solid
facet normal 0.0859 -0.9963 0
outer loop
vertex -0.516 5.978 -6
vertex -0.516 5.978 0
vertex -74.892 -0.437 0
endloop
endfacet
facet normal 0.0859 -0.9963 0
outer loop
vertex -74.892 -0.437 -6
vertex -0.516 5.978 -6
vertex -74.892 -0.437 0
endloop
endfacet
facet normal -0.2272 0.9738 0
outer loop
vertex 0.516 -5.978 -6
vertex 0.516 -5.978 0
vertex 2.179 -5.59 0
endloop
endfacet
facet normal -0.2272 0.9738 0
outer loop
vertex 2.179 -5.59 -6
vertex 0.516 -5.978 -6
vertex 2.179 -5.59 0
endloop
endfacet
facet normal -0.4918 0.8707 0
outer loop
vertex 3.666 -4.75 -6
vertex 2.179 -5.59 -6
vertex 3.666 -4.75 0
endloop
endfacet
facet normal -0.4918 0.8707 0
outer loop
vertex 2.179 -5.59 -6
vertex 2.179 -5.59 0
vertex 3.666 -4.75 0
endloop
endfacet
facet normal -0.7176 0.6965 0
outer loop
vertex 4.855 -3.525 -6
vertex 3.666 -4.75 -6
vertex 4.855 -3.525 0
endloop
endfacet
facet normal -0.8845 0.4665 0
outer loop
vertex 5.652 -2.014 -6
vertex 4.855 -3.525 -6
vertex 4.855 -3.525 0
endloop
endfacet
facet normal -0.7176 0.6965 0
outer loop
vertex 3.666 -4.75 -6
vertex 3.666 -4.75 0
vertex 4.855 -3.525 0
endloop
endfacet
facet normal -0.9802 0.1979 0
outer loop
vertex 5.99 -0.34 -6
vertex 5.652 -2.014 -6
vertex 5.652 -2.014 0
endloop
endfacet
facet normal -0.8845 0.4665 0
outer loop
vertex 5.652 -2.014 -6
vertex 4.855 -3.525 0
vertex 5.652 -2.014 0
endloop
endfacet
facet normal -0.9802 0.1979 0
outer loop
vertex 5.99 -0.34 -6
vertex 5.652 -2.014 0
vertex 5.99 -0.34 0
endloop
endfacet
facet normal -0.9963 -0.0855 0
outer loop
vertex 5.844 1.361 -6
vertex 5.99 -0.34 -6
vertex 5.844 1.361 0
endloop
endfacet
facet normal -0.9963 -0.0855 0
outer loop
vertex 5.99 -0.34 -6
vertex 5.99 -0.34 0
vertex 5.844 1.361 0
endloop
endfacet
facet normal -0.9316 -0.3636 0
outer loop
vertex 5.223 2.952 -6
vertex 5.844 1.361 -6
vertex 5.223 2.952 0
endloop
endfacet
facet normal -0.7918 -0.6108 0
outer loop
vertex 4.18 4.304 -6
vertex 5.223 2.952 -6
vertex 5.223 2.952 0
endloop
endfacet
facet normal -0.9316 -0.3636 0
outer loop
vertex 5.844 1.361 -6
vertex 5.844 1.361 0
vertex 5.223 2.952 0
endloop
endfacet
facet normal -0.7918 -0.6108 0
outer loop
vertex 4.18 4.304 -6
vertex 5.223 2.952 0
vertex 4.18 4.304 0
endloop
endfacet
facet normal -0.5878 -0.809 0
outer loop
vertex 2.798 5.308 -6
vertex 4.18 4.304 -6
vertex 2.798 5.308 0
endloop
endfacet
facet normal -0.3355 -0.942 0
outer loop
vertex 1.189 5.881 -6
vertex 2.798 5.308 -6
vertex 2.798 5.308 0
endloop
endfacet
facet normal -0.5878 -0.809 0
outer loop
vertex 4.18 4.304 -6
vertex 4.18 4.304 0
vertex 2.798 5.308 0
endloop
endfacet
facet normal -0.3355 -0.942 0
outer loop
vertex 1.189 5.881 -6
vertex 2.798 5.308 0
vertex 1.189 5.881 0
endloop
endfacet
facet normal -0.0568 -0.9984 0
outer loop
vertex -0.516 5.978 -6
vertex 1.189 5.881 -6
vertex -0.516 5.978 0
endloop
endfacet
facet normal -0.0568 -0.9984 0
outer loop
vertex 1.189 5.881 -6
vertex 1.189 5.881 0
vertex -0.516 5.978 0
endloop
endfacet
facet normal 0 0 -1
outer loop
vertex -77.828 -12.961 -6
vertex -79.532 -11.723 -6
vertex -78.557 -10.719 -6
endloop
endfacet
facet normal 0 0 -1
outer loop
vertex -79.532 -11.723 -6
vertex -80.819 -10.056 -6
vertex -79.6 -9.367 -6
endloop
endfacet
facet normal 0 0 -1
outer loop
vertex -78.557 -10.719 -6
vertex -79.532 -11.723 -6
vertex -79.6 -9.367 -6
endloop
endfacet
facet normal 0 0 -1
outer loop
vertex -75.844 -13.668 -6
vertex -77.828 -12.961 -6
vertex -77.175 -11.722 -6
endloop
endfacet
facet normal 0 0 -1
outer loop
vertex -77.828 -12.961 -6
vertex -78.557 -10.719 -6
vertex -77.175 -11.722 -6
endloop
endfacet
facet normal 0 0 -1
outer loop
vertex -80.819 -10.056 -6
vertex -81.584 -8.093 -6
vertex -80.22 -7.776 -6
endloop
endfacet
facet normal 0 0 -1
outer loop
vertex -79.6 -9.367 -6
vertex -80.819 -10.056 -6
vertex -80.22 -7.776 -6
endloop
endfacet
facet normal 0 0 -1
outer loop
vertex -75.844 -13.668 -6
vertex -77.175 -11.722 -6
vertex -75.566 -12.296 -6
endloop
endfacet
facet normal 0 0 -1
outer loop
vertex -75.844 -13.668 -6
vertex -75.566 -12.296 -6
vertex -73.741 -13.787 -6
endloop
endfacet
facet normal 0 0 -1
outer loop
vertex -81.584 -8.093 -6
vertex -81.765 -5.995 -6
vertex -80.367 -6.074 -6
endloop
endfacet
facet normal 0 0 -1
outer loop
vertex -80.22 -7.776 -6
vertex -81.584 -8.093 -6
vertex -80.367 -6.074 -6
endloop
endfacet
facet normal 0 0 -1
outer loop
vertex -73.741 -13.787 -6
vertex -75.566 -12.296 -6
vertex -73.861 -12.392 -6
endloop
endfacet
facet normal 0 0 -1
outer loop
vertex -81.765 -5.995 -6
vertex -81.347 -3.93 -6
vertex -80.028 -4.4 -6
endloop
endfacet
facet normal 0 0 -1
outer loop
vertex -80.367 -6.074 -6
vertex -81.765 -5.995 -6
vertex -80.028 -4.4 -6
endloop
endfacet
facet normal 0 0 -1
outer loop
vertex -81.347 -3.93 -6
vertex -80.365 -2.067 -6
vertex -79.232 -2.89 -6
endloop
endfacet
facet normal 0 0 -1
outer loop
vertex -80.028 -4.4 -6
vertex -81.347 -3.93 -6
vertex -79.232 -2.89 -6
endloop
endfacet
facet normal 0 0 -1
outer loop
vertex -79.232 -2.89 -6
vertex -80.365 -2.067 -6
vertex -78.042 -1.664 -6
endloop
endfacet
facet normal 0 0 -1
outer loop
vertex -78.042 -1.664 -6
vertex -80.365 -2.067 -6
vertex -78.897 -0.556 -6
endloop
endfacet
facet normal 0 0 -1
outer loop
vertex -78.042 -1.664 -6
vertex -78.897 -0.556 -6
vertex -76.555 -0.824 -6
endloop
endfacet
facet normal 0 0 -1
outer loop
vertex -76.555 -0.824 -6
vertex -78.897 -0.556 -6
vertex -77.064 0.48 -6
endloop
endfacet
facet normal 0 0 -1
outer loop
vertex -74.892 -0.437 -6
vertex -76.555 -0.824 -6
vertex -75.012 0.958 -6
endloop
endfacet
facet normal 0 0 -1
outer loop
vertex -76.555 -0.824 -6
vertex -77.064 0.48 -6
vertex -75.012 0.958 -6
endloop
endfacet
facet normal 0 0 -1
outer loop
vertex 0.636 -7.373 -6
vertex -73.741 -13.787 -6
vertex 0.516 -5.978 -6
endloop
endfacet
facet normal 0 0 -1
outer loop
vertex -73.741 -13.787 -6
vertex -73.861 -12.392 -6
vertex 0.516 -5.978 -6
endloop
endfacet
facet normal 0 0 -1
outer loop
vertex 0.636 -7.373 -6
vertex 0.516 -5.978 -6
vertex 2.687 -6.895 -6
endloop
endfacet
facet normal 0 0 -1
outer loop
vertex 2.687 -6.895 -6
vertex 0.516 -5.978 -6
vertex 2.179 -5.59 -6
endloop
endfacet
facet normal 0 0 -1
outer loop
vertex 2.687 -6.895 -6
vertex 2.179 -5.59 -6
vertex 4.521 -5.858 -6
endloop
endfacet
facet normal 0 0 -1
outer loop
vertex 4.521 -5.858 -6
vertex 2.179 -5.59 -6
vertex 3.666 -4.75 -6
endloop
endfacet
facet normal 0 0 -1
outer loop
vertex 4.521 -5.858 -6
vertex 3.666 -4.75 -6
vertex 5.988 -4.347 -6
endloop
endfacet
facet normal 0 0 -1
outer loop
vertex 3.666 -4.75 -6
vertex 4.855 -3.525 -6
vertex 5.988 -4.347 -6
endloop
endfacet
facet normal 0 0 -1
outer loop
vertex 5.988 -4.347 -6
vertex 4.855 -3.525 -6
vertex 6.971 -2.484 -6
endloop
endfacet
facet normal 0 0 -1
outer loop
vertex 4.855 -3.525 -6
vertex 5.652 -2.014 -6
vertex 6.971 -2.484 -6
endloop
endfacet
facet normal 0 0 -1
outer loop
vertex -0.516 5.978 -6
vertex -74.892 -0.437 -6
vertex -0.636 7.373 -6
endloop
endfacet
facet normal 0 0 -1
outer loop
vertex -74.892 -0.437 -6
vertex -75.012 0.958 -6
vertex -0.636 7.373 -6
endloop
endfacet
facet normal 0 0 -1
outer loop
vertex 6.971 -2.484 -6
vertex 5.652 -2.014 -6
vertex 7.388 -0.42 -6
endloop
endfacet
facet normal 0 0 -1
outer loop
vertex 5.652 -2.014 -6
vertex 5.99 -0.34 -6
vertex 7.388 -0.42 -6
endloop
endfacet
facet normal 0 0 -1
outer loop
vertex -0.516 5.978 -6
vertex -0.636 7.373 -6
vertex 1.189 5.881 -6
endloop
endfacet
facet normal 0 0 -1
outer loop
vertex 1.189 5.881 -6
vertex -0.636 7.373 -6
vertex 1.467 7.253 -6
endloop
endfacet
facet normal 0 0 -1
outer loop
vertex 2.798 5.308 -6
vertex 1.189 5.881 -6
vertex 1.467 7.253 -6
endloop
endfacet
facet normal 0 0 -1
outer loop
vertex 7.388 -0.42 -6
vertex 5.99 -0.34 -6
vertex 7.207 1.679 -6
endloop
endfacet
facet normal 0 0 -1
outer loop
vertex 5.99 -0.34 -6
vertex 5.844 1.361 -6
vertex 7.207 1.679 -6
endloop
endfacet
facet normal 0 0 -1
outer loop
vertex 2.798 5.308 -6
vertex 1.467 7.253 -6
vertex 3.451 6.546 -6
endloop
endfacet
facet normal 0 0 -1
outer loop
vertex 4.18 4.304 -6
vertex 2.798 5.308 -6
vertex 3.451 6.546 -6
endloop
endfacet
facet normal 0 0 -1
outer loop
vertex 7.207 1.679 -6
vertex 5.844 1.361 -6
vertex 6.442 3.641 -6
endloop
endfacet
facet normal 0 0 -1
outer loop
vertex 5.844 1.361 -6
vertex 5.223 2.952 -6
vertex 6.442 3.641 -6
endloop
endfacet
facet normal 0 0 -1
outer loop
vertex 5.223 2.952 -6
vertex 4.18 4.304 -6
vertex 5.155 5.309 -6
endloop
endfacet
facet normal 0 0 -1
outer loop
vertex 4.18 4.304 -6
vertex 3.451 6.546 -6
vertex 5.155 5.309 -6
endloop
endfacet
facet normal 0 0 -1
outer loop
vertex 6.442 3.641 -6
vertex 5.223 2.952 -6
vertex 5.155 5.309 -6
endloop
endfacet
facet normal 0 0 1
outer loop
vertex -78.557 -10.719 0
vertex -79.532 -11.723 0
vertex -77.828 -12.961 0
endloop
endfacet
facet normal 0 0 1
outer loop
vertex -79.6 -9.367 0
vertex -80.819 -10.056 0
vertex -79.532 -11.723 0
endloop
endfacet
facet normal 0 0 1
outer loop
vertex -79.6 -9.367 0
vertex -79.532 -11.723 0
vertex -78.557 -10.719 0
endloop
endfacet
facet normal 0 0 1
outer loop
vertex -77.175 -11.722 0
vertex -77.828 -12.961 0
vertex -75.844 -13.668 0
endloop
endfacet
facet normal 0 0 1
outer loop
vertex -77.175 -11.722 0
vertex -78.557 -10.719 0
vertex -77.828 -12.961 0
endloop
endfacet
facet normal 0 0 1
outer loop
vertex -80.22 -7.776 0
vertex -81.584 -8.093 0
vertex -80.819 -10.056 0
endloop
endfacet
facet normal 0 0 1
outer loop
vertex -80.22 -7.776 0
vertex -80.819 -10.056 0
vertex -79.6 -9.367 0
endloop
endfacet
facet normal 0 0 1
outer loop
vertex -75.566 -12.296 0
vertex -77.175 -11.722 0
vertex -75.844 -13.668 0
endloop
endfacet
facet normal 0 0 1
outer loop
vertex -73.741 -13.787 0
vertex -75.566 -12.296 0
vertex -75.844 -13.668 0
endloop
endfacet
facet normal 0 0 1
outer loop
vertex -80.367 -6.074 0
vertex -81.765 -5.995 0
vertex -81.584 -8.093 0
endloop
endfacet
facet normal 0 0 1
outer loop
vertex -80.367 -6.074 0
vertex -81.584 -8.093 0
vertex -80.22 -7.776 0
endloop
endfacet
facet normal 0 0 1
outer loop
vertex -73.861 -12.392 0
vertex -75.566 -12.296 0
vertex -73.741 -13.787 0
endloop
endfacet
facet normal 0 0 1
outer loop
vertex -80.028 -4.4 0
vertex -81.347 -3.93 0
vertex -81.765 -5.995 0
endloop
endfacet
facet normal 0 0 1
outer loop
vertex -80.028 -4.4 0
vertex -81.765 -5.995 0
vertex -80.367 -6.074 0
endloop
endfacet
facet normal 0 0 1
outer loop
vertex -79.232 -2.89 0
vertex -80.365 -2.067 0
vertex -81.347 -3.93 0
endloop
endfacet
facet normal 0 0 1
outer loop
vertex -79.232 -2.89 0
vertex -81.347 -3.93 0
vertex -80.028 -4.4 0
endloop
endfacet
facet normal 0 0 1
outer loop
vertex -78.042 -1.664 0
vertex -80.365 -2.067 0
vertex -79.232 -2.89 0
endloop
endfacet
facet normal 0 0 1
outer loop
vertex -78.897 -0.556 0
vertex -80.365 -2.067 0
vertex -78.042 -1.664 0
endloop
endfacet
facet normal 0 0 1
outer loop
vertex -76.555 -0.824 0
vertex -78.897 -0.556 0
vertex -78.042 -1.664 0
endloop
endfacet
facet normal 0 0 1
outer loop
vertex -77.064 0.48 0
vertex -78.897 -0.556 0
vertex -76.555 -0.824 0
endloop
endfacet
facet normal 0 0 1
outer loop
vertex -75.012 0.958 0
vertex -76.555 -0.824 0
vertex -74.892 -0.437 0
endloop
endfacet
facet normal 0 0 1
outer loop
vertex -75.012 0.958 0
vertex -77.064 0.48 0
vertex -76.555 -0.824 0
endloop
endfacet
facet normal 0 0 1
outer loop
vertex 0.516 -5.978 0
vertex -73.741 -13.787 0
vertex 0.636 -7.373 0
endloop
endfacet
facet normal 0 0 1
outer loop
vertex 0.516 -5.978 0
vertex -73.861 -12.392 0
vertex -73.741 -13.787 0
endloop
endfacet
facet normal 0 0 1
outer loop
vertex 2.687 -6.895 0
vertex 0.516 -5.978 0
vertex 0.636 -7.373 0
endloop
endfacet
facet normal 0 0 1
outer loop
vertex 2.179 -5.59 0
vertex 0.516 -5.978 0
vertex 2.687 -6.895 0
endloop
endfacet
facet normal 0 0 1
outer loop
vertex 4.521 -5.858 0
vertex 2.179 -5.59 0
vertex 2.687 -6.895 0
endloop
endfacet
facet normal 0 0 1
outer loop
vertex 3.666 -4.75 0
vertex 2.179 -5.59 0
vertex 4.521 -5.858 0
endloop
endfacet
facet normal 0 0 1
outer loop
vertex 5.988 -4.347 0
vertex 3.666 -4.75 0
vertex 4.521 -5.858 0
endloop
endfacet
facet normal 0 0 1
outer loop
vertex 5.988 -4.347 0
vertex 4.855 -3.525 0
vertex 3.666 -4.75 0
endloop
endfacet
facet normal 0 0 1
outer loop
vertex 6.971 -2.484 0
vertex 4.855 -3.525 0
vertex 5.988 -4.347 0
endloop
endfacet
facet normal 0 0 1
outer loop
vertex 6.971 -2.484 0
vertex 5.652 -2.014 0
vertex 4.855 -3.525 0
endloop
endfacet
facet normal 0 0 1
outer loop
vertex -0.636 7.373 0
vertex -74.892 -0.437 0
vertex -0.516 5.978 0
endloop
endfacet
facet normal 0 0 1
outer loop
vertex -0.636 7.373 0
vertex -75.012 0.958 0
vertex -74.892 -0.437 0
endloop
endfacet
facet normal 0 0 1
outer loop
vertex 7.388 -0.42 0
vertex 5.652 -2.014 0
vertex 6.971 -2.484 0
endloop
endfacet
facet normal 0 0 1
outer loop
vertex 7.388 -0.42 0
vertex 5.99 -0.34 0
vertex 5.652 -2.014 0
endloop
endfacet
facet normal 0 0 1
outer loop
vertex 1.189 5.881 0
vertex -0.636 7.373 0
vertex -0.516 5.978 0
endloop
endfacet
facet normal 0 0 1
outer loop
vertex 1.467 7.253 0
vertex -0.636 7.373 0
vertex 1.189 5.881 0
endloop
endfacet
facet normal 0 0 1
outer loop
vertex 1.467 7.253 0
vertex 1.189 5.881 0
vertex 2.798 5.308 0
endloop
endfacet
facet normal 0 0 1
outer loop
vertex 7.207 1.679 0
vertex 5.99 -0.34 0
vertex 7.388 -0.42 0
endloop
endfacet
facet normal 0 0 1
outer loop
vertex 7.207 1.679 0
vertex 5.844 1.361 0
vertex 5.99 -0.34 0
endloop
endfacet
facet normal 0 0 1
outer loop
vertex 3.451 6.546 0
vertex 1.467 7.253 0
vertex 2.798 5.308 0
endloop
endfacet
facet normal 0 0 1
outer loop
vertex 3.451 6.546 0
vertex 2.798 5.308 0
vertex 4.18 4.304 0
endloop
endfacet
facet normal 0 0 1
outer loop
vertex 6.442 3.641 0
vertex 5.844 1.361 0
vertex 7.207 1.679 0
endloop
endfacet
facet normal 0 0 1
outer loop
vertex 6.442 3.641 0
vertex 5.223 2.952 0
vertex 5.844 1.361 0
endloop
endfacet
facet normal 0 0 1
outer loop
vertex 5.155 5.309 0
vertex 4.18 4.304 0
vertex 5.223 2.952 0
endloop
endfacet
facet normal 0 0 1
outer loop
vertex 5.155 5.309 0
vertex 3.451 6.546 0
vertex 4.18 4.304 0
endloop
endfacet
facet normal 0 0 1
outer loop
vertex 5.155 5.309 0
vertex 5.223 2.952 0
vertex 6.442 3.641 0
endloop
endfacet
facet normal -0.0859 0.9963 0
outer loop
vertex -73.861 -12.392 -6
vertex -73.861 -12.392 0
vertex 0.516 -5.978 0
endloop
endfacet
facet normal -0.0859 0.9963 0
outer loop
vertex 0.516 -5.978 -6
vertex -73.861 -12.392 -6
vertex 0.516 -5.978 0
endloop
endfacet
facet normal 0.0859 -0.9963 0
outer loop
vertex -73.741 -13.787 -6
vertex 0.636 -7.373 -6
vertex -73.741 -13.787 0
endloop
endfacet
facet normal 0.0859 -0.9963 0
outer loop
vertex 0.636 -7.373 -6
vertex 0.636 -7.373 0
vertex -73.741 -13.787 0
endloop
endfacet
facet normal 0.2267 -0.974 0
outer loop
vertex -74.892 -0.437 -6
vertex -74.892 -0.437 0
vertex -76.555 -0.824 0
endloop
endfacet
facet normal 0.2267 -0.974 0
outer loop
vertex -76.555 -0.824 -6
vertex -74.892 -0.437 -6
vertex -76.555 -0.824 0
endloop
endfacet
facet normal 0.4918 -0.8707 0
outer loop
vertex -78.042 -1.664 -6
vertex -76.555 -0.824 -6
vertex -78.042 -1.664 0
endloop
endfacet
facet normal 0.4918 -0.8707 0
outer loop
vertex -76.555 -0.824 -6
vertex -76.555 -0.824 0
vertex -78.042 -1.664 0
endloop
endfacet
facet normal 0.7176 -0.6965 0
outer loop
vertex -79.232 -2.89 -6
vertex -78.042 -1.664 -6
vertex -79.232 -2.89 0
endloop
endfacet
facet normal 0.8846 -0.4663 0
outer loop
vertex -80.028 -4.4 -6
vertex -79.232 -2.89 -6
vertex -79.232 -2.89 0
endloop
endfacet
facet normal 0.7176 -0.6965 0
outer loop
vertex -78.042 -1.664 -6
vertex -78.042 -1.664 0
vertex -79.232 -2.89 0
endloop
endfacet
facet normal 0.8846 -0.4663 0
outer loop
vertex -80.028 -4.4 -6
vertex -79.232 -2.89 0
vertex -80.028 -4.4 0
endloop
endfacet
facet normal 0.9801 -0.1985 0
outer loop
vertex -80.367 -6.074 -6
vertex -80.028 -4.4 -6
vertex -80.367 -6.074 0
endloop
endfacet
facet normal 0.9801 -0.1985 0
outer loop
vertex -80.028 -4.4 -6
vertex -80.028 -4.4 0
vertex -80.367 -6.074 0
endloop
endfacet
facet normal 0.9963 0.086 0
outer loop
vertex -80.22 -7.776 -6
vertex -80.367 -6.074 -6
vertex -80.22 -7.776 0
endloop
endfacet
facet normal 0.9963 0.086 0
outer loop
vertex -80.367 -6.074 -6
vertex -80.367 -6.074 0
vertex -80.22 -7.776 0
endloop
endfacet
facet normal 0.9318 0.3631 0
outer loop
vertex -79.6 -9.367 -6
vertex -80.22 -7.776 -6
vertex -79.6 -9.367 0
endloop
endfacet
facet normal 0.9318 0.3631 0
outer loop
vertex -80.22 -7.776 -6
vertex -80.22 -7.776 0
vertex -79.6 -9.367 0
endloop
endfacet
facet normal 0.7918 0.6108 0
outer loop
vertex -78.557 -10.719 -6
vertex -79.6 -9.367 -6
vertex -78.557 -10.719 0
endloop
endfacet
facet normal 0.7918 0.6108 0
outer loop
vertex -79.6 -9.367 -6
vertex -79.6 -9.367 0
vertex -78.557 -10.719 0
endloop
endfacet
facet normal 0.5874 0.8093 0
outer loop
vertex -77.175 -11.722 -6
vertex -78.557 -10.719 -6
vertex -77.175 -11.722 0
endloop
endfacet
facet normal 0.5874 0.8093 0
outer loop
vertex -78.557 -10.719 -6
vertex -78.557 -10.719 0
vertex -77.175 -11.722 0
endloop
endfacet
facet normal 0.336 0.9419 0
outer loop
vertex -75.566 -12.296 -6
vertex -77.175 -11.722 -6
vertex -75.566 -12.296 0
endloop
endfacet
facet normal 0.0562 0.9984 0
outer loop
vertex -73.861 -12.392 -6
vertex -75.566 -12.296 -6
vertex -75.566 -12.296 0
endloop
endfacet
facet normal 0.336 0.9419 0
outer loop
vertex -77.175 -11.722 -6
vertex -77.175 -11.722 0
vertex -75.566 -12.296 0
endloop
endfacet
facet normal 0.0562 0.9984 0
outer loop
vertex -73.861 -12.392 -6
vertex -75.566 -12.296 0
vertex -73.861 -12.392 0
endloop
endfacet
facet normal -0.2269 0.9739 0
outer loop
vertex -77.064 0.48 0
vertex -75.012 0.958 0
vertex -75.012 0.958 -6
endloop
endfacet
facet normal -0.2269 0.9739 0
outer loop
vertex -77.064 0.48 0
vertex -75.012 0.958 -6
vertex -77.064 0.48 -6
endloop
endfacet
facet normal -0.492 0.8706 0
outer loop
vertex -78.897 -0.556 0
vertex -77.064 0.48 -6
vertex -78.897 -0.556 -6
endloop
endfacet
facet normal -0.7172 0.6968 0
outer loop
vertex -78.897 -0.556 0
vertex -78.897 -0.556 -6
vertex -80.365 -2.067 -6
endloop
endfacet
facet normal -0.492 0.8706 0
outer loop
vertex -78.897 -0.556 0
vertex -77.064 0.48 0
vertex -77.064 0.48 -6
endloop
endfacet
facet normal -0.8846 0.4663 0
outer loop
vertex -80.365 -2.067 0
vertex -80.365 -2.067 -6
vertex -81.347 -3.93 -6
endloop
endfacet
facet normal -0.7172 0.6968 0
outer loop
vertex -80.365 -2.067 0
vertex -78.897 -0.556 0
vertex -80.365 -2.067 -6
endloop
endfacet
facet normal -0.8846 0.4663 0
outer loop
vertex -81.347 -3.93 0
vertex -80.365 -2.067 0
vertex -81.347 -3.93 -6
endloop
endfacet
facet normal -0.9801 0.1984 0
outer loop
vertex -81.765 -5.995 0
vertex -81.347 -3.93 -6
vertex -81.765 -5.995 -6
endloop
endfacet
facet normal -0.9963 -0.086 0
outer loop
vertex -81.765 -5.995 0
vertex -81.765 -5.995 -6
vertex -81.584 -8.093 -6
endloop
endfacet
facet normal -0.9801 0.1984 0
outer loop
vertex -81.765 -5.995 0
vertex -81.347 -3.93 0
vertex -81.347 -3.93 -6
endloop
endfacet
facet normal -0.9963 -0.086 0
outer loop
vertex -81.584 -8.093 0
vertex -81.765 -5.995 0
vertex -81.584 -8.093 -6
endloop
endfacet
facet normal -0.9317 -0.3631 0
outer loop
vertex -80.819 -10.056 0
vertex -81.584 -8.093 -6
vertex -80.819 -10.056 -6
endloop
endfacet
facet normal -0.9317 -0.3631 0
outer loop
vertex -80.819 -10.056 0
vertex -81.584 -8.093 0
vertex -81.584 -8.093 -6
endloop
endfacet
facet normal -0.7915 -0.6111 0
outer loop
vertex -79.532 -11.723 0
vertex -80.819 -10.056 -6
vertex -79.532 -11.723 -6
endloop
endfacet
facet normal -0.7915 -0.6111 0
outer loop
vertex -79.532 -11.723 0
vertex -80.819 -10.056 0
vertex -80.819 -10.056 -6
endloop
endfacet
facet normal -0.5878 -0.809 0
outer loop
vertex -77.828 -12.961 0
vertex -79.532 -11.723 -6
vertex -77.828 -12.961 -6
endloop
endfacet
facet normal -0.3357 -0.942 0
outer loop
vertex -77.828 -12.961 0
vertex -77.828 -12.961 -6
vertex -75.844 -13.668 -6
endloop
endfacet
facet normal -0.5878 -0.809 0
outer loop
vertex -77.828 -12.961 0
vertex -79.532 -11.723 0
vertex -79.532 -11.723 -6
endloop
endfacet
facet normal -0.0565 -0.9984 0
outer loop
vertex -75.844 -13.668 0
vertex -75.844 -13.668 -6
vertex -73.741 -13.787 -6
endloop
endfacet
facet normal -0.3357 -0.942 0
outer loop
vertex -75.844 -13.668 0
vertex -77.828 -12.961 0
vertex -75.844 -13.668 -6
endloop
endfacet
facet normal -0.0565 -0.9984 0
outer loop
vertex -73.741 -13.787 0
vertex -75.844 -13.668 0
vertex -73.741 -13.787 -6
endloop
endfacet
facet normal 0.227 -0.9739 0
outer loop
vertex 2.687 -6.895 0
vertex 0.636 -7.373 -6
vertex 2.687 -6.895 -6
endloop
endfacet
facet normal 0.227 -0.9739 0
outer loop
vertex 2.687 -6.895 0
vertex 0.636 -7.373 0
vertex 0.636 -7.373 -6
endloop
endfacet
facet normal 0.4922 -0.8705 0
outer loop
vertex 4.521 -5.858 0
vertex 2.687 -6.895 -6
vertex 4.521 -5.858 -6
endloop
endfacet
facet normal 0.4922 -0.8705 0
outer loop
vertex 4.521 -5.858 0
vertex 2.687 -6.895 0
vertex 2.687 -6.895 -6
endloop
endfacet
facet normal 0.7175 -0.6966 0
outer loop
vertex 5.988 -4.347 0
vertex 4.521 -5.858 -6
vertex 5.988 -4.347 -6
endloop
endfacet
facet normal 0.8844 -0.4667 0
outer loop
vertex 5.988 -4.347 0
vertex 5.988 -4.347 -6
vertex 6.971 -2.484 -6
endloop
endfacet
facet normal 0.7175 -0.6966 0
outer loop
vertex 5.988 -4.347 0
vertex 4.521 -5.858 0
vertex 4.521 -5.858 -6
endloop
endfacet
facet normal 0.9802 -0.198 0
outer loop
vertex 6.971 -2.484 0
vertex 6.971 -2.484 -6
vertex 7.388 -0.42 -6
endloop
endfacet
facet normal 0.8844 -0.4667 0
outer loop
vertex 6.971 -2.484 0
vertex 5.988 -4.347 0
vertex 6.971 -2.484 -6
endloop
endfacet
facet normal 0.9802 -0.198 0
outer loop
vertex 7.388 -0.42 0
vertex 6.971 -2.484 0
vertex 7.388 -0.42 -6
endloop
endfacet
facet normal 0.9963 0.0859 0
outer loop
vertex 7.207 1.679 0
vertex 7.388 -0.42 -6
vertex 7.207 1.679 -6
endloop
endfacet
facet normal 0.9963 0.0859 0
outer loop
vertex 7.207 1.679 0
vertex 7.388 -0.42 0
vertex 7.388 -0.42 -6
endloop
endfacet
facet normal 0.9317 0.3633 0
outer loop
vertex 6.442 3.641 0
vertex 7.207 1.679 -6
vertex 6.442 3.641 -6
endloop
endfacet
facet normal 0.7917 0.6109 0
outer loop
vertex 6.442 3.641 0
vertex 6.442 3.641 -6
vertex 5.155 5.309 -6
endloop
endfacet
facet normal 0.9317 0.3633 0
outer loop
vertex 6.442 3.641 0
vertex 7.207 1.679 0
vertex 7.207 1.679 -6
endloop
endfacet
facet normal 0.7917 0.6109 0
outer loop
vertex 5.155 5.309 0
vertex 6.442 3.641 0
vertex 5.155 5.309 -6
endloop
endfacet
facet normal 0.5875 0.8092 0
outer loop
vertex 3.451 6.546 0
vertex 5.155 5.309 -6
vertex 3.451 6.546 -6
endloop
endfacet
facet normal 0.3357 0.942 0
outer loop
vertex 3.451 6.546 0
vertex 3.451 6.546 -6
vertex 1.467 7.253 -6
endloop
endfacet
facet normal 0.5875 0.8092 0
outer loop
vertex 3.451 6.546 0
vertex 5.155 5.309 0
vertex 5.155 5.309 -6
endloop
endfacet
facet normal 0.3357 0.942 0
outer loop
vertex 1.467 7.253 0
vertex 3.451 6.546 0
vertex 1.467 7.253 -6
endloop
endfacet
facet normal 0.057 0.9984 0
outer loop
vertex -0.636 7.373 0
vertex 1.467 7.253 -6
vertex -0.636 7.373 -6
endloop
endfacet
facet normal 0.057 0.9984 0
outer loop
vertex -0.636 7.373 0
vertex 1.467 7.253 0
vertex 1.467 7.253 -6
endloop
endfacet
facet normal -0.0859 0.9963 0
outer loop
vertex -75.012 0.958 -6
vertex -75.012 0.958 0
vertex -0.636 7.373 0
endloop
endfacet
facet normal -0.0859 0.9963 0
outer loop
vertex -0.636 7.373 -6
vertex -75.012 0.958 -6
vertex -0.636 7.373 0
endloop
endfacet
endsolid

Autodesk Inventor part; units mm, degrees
ref_plane "YZ Plane" through (0, 0, 0) normal (1, 0, 0) x (0, 1, 0)
ref_plane "XZ Plane" through (0, 0, 0) normal (0, 1, 0) x (-1, 0, 0)
ref_plane "XY Plane" through (0, 0, 0) normal (0, 0, 1) x (1, 0, 0)
sketch "Эскиз1" plane through (0, 0, 0) normal (0, 0, 1) x (1, 0, 0)
  arc A0 (0.5156, -5.9778) -> (-0.5156, 5.9778) centre (0, 0) ccw
  arc A1 (0.6359, -7.3726) -> (-0.6359, 7.3726) centre (0, 0) ccw
  circle A2 centre (-74.3766, -6.4146) radius 2 projected
  arc A3 (-74.8921, -0.4368) -> (-73.861, -12.3924) centre (-74.3766, -6.4146) ccw
  arc A4 (-75.0124, 0.9581) -> (-73.7407, -13.7872) centre (-74.3766, -6.4146) ccw
  line L0 (-75.0124, 0.9581) -> (-0.6359, 7.3726)
  line L1 (0.6359, -7.3726) -> (-73.7407, -13.7872)
  line L2 (-73.861, -12.3924) -> (0.5156, -5.9778)
  line L3 (-0.5156, 5.9778) -> (-74.8921, -0.4368)
  dimension "d0" = 12
  dimension "d1" = 1.4
  dimension "d2" = 12
  dimension "d3" = 1.4
extrude "Выдавливание1" add sketch "Эскиз1" against normal blind 6 contours L1 A4 L0 A1
properties part number "ремень оси y моторный"
